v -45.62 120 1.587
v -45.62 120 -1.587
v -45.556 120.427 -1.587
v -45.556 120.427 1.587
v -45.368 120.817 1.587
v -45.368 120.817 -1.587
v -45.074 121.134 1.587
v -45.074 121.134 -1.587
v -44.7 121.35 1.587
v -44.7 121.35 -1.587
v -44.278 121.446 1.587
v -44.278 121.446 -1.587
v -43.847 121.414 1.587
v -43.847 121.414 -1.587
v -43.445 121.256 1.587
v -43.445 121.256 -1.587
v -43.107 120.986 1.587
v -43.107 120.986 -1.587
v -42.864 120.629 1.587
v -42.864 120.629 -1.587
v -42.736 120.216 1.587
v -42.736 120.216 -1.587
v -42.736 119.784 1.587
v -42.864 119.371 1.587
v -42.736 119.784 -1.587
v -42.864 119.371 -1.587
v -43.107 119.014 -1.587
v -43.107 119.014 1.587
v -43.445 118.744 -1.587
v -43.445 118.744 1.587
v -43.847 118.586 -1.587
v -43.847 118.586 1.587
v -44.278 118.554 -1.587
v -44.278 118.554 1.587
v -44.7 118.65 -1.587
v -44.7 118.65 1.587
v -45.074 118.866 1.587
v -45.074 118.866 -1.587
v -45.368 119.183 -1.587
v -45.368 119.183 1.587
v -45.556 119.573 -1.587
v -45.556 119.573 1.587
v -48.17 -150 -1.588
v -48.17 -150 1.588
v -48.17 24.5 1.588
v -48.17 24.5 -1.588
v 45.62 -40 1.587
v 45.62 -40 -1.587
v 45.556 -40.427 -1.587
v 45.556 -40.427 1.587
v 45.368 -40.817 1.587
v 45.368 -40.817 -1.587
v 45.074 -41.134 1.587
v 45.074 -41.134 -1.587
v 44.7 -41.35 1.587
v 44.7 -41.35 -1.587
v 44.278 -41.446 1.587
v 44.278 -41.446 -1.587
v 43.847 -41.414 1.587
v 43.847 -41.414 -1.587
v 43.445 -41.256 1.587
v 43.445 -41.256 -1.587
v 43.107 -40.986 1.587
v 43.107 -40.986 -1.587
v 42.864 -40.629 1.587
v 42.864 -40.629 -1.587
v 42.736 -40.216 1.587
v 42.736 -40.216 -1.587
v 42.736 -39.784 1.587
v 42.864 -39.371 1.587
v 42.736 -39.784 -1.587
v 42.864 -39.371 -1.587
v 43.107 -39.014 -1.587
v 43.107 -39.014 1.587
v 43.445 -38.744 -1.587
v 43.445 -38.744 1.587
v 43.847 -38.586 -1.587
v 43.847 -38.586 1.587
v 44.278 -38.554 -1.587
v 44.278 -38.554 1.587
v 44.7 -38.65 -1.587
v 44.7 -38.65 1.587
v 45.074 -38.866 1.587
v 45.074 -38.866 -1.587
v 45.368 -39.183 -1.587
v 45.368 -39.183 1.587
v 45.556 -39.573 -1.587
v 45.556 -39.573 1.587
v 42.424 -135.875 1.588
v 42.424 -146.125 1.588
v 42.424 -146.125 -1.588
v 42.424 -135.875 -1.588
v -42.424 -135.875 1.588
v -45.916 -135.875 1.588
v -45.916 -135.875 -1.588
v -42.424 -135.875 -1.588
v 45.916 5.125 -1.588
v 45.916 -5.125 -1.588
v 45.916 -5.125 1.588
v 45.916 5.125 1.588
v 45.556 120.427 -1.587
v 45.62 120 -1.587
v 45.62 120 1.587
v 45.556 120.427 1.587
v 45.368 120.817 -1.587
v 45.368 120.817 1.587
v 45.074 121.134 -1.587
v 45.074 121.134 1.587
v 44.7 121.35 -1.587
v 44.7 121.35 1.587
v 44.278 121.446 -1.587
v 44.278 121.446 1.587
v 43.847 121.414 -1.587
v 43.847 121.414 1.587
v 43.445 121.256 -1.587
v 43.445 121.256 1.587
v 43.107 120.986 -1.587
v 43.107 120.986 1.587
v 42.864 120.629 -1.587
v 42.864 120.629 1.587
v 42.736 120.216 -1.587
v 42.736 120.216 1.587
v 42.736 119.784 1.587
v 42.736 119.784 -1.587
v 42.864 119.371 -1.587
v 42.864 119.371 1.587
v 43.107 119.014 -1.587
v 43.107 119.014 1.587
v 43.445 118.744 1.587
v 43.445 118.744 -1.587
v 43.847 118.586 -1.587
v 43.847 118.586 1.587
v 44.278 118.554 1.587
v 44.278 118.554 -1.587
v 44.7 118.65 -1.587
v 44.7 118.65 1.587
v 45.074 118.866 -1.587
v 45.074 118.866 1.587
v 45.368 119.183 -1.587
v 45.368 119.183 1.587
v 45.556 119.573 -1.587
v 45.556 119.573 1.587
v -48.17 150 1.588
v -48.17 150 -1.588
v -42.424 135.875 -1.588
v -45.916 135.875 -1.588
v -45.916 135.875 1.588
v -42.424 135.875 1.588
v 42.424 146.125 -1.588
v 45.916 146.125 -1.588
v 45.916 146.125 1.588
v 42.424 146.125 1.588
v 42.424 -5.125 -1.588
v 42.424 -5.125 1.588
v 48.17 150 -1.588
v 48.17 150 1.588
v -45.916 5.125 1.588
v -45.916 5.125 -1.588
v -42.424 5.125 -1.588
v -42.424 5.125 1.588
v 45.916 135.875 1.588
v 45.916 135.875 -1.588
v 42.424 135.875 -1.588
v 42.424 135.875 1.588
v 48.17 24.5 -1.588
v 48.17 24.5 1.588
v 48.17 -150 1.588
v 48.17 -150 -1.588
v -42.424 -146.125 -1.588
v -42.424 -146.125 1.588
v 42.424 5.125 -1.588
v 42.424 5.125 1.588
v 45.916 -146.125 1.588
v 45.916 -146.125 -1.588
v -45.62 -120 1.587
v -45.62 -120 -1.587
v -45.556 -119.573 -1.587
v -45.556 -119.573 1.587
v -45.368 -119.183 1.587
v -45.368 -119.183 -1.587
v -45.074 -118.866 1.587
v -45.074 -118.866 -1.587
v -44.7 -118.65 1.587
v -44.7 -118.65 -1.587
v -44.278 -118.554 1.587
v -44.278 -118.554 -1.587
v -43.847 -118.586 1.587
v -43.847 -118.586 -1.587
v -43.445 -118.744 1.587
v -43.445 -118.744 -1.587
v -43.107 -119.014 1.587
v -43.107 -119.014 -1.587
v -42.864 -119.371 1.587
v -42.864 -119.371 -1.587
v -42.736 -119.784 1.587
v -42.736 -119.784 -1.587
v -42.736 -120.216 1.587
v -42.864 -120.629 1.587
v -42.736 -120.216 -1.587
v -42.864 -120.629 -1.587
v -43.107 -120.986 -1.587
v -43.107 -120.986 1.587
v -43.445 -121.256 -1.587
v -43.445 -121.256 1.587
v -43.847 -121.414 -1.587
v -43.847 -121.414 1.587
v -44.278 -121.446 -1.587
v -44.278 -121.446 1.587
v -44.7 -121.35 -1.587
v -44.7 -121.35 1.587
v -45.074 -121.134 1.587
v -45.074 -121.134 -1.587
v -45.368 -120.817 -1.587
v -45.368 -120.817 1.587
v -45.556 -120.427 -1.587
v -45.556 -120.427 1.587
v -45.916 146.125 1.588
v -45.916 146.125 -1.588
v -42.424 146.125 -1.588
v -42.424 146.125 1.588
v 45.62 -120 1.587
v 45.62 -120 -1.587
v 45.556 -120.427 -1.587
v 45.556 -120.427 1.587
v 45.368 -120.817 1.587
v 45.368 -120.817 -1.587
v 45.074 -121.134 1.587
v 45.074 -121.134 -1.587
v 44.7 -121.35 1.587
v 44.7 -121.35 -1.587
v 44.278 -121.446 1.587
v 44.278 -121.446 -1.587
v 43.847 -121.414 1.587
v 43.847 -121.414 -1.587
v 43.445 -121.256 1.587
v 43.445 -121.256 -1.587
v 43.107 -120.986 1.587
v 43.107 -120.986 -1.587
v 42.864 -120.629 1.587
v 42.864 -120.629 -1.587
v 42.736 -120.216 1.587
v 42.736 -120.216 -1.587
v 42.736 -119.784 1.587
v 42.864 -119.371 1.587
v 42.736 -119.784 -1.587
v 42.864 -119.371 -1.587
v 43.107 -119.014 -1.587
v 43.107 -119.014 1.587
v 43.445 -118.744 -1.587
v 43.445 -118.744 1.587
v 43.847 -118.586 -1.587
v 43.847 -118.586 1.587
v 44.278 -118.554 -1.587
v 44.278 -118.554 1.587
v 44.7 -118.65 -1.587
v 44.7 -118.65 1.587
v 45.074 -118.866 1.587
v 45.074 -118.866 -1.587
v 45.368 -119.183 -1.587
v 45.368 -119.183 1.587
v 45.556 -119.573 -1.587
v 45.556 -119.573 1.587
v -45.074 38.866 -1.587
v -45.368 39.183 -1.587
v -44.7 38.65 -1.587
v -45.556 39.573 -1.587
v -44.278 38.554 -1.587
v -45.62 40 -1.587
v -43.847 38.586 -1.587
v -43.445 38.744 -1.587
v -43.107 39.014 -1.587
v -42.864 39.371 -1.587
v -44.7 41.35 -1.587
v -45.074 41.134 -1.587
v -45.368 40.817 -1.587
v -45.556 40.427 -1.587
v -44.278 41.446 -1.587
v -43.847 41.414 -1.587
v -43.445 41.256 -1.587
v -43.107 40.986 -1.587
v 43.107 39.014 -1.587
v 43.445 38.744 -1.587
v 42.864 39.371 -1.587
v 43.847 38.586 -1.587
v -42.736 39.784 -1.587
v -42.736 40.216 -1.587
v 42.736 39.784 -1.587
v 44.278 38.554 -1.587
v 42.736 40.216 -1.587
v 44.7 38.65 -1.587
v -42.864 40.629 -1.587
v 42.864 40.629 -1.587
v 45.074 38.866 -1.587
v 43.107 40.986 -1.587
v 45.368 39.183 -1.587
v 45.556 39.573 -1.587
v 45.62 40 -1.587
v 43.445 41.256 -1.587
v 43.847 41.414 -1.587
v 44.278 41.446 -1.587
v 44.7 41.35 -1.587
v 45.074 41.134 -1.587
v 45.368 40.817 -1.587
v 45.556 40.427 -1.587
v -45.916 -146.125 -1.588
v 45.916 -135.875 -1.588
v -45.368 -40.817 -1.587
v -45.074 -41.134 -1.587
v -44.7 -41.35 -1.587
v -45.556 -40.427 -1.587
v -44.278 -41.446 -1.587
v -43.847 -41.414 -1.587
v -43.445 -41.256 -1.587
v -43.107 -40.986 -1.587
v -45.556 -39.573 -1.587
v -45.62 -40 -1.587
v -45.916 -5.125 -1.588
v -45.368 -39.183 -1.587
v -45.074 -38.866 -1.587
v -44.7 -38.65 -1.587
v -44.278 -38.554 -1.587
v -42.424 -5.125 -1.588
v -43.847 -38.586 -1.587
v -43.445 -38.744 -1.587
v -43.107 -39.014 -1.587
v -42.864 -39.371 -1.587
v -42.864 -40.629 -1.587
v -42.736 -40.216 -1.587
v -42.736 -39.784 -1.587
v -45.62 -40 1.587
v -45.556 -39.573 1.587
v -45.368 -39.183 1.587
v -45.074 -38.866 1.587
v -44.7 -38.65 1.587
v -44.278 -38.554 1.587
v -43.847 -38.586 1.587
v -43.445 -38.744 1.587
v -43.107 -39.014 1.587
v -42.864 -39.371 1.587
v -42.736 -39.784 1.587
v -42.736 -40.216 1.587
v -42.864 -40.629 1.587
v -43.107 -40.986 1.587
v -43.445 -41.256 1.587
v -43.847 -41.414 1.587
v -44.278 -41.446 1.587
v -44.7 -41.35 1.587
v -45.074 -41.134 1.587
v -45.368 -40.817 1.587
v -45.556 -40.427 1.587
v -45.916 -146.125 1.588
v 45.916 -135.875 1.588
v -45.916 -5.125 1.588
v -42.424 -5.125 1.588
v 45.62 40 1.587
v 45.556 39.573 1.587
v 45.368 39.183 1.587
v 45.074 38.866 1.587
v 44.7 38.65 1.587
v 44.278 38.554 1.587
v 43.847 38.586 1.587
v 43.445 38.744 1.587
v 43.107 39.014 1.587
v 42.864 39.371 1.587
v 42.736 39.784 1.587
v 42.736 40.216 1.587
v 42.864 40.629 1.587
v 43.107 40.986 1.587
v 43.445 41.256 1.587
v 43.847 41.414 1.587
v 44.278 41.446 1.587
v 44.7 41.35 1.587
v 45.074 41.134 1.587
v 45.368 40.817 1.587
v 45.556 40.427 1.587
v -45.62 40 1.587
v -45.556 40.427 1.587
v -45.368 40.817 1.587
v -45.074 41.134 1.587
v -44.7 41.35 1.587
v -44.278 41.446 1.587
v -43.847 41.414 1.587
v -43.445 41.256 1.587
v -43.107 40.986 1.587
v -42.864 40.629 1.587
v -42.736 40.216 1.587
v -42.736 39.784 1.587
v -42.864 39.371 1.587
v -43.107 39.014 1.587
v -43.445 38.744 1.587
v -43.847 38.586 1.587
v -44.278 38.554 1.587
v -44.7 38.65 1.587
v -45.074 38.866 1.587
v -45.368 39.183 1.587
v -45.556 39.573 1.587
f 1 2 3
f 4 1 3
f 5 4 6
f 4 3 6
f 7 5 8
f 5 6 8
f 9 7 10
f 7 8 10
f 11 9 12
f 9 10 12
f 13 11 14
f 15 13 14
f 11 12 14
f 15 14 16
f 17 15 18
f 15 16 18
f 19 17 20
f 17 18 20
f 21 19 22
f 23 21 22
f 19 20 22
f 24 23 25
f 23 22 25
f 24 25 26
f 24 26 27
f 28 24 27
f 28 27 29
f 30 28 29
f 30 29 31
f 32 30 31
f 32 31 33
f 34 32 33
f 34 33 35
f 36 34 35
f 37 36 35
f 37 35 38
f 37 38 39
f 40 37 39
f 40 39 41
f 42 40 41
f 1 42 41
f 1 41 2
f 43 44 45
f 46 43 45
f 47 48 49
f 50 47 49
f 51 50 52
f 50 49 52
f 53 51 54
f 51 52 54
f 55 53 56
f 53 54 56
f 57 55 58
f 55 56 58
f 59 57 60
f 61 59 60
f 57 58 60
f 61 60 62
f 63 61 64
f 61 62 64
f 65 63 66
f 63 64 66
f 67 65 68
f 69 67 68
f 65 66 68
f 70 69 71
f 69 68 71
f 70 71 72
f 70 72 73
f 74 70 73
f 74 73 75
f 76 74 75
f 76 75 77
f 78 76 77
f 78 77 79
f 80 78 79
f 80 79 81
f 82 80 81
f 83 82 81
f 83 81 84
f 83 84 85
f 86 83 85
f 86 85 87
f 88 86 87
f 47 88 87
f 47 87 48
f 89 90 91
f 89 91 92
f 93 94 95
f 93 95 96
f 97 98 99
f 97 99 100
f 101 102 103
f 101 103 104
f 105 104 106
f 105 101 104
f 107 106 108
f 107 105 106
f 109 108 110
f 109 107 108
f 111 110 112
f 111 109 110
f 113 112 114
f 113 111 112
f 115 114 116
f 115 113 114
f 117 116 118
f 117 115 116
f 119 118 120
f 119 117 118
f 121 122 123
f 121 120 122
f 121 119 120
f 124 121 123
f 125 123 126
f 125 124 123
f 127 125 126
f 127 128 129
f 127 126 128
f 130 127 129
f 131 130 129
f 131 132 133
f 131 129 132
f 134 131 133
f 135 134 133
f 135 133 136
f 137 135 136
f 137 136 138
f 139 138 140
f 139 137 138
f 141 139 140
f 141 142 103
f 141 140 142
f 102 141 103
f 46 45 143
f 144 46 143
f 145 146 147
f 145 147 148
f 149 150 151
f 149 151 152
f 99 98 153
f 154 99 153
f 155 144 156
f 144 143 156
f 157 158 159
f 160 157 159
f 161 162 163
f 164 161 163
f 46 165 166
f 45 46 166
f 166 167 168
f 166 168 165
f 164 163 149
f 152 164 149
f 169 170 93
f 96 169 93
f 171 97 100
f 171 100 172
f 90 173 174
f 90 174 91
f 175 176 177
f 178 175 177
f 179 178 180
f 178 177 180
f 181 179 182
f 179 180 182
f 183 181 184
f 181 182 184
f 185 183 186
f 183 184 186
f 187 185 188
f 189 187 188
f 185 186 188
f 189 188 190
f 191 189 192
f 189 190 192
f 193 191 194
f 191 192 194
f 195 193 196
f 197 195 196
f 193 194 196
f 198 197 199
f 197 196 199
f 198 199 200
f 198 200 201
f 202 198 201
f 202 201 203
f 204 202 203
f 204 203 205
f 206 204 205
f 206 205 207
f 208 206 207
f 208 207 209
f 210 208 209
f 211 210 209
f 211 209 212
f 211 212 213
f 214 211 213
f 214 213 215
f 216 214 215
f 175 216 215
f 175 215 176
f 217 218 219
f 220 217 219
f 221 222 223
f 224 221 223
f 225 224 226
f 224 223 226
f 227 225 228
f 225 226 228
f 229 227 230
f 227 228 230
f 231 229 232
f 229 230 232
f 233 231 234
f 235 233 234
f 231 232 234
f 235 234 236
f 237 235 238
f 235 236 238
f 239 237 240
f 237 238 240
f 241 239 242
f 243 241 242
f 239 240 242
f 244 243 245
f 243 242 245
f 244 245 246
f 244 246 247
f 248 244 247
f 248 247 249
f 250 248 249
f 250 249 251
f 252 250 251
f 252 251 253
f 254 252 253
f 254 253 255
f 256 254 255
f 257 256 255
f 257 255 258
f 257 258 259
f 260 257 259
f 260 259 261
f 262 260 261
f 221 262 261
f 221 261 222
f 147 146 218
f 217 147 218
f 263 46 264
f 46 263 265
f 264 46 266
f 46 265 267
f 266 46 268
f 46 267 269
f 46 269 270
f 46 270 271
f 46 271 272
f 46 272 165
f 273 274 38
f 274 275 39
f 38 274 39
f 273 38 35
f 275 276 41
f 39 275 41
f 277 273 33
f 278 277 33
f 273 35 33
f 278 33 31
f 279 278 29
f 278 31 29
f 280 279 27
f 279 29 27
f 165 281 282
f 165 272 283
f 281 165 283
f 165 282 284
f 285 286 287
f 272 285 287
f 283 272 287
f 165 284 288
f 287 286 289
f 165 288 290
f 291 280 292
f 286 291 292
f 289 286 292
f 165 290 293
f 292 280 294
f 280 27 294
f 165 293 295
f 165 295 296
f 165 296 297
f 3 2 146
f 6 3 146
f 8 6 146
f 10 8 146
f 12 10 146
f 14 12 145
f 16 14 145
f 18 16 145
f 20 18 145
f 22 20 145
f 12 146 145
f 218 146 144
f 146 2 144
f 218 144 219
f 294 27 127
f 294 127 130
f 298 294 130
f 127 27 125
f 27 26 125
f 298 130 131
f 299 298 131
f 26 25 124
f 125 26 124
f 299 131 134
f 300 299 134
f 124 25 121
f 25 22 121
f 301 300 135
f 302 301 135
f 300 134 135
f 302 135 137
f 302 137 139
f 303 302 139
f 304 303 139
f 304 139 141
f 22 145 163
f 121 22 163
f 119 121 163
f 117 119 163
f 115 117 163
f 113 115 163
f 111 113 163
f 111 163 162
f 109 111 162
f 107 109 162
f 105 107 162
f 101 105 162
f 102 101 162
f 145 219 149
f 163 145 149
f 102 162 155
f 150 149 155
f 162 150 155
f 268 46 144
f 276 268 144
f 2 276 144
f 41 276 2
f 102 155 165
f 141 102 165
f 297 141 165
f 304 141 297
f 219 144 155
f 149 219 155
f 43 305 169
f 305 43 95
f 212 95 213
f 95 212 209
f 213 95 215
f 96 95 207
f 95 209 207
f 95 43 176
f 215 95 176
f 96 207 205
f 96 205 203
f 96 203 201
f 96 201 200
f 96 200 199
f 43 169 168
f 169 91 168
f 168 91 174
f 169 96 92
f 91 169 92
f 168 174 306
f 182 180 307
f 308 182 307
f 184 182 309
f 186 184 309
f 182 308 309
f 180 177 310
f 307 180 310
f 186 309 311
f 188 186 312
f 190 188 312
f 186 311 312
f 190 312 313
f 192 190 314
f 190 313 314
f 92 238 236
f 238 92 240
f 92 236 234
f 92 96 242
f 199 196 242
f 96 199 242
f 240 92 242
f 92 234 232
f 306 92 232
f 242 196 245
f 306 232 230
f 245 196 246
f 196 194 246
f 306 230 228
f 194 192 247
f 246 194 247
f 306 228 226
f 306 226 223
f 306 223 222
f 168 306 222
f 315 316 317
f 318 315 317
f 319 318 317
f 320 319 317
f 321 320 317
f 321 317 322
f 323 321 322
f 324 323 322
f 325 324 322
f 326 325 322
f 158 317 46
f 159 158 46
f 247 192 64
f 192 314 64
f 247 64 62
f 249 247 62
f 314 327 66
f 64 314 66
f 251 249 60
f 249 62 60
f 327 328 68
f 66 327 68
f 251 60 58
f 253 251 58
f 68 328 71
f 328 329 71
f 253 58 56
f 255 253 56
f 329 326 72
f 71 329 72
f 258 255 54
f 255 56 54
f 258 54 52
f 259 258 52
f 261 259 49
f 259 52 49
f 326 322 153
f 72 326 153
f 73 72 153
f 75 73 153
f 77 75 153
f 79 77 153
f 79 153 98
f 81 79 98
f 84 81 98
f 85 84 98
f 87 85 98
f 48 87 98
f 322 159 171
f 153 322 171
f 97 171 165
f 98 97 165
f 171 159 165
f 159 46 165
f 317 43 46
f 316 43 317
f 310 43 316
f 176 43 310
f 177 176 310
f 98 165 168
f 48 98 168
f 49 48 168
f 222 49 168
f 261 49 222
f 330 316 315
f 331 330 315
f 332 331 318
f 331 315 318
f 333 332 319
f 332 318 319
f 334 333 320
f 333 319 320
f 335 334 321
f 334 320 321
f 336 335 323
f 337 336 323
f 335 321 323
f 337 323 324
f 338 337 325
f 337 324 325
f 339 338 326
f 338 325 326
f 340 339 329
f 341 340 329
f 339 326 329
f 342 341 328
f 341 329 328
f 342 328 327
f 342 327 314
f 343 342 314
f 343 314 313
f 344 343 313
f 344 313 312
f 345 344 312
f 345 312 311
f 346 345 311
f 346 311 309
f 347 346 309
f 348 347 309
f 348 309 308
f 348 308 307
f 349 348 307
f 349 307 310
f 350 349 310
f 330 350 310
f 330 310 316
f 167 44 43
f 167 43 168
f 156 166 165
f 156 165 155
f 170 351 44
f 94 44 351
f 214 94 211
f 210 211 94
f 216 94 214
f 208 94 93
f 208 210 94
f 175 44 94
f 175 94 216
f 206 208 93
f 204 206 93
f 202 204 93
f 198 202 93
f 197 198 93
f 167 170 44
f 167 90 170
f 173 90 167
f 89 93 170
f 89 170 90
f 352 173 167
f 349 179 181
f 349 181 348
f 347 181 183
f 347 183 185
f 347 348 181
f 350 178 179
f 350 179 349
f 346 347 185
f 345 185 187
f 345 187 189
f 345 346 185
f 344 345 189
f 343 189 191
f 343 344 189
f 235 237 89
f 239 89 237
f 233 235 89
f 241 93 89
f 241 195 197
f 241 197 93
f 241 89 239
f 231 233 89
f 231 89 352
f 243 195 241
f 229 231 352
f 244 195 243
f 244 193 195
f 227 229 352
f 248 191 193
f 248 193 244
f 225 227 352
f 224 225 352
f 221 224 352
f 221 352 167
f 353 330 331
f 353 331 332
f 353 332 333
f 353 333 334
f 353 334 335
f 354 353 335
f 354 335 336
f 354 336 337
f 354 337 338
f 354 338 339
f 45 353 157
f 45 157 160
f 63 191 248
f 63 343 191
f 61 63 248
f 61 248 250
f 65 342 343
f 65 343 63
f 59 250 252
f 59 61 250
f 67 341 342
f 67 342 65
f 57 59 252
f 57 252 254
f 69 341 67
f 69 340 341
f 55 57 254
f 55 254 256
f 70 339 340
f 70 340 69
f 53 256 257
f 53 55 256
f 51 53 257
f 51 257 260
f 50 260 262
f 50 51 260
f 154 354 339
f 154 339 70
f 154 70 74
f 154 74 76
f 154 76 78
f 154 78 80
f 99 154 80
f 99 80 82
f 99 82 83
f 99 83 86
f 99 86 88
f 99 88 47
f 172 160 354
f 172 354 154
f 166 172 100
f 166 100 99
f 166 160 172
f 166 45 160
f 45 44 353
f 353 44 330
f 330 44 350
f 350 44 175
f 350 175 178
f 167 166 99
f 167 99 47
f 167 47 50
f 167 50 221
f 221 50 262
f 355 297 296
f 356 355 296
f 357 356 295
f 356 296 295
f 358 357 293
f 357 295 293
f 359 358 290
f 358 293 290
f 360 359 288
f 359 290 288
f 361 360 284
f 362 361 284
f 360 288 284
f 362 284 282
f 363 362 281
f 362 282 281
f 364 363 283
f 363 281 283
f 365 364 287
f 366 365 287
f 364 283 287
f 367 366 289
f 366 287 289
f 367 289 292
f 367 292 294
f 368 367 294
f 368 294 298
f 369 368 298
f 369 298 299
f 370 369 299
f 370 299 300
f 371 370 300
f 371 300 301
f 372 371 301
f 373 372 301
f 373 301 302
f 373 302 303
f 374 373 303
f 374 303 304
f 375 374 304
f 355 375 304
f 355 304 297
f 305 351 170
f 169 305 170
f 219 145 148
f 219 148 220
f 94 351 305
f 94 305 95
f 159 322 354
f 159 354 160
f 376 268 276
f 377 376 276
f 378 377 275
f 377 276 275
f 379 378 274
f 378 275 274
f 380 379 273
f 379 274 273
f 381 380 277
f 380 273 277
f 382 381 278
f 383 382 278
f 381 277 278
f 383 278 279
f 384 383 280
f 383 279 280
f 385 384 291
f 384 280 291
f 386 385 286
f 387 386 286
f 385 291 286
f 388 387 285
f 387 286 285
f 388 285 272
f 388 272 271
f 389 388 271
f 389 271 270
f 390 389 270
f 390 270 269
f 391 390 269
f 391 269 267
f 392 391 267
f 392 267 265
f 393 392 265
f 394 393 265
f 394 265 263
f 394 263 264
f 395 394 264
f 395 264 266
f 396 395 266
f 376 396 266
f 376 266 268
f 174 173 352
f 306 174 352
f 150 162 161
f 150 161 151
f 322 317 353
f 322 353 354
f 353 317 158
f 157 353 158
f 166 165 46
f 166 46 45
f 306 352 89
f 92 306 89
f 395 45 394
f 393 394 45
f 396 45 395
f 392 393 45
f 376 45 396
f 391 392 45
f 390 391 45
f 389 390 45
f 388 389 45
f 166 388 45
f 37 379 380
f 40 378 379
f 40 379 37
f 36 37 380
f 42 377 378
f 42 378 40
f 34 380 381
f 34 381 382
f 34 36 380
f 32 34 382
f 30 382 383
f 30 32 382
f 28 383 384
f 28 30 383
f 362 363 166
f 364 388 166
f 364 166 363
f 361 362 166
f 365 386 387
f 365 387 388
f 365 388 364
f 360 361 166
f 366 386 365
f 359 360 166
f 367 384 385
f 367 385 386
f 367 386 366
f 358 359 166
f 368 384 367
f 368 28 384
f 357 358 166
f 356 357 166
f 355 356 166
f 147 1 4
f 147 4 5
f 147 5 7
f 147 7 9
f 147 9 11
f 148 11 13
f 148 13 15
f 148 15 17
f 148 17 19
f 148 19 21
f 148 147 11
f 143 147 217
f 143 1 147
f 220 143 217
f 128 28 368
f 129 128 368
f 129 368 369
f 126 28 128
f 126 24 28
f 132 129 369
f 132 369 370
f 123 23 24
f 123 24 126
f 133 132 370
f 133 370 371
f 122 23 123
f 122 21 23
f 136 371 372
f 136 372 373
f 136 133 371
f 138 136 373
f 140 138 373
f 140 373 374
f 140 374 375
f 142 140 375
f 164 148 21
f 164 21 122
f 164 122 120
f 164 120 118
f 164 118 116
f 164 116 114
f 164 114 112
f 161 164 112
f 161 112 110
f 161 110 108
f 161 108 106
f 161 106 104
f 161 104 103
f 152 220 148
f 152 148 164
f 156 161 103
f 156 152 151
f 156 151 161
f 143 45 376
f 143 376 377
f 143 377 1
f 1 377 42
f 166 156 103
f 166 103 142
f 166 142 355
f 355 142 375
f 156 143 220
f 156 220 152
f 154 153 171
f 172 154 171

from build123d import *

# Parameters (mm, degrees)
SKETCH1_W              = 96.34
SKETCH1_H              = 300
BOSS_EXTRUDE1_DEPTH    = 1.5875
SKETCH1_3_W            = 3.4925
SKETCH1_3_H            = 10.25
CUT_EXTRUDE1_DEPTH     = 158.552750075
M2_5_CLEARANCE_HOLE1_D = 2.9
LPATTERN1_COUNT        = 4
LPATTERN1_PITCH        = 80
MIRROR1_COPY_1_D       = 2.9
MIRROR1_COPY_2_D       = 2.9
MIRROR1_COPY_3_D       = 2.9
MIRROR1_COPY_4_D       = 2.9


with BuildPart() as part:
    # Sketch1 → Boss-Extrude1 (new, symmetric)
    with BuildSketch(Plane.XY):
        Rectangle(SKETCH1_W, SKETCH1_H)
    extrude(amount=BOSS_EXTRUDE1_DEPTH, both=True)

    # Sketch1<3> → Cut-Extrude1 (cut, symmetric)
    with BuildSketch(Plane.XY):
        with Locations((-44.17, 141)):
            Rectangle(SKETCH1_3_W, SKETCH1_3_H)
        with Locations((-44.17, 0)):
            Rectangle(SKETCH1_3_W, SKETCH1_3_H)
        with Locations((-44.17, -141)):
            Rectangle(SKETCH1_3_W, SKETCH1_3_H)
    cut_extrude1 = extrude(amount=CUT_EXTRUDE1_DEPTH, both=True, mode=Mode.SUBTRACT)

    # M2.5 Clearance Hole1 (through all)
    with Locations(Plane.XY.offset(1.5875)):
        with Locations((-44.17, 120)):
            m2_5_clearance_hole1 = Hole(M2_5_CLEARANCE_HOLE1_D / 2)

    # LPattern1: M2.5 Clearance Hole1 ×4
    with Locations(*[(0, -i * LPATTERN1_PITCH, 0) for i in range(1, LPATTERN1_COUNT)]):
        add(m2_5_clearance_hole1, mode=Mode.SUBTRACT)

    # Mirror1: Cut-Extrude1 across plane
    add(cut_extrude1.mirror(Plane(origin=(0, 0, 0), x_dir=(0, 0, 1), z_dir=(1, 0, 0))), mode=Mode.SUBTRACT)

    # Mirror1 copy 1 (through all)
    with Locations(Plane(origin=(0, -80, 1.5875), x_dir=(-1, 0, 0), z_dir=(0, 0, 1))):
        with Locations((-44.17, -120)):
            Hole(MIRROR1_COPY_1_D / 2)

    # Mirror1 copy 2 (through all)
    with Locations(Plane(origin=(0, -160, 1.5875), x_dir=(-1, 0, 0), z_dir=(0, 0, 1))):
        with Locations((-44.17, -120)):
            Hole(MIRROR1_COPY_2_D / 2)

    # Mirror1 copy 3 (through all)
    with Locations(Plane(origin=(0, -240, 1.5875), x_dir=(-1, 0, 0), z_dir=(0, 0, 1))):
        with Locations((-44.17, -120)):
            Hole(MIRROR1_COPY_3_D / 2)

    # Mirror1 copy 4 (through all)
    with Locations(Plane(origin=(0, 0, 1.5875), x_dir=(-1, 0, 0), z_dir=(0, 0, 1))):
        with Locations((-44.17, -120)):
            Hole(MIRROR1_COPY_4_D / 2)


with BuildPart() as body_2:
    # Split1: the piece on the far side of the plane
    add(part.part)
    split(bisect_by=Plane.ZX.offset(24.5), keep=Keep.BOTTOM)


with BuildPart() as part_1:
    add(part.part)

    # Split1
    split(bisect_by=Plane.ZX.offset(24.5), keep=Keep.TOP)


solid = Compound([body_2.part, part_1.part])
